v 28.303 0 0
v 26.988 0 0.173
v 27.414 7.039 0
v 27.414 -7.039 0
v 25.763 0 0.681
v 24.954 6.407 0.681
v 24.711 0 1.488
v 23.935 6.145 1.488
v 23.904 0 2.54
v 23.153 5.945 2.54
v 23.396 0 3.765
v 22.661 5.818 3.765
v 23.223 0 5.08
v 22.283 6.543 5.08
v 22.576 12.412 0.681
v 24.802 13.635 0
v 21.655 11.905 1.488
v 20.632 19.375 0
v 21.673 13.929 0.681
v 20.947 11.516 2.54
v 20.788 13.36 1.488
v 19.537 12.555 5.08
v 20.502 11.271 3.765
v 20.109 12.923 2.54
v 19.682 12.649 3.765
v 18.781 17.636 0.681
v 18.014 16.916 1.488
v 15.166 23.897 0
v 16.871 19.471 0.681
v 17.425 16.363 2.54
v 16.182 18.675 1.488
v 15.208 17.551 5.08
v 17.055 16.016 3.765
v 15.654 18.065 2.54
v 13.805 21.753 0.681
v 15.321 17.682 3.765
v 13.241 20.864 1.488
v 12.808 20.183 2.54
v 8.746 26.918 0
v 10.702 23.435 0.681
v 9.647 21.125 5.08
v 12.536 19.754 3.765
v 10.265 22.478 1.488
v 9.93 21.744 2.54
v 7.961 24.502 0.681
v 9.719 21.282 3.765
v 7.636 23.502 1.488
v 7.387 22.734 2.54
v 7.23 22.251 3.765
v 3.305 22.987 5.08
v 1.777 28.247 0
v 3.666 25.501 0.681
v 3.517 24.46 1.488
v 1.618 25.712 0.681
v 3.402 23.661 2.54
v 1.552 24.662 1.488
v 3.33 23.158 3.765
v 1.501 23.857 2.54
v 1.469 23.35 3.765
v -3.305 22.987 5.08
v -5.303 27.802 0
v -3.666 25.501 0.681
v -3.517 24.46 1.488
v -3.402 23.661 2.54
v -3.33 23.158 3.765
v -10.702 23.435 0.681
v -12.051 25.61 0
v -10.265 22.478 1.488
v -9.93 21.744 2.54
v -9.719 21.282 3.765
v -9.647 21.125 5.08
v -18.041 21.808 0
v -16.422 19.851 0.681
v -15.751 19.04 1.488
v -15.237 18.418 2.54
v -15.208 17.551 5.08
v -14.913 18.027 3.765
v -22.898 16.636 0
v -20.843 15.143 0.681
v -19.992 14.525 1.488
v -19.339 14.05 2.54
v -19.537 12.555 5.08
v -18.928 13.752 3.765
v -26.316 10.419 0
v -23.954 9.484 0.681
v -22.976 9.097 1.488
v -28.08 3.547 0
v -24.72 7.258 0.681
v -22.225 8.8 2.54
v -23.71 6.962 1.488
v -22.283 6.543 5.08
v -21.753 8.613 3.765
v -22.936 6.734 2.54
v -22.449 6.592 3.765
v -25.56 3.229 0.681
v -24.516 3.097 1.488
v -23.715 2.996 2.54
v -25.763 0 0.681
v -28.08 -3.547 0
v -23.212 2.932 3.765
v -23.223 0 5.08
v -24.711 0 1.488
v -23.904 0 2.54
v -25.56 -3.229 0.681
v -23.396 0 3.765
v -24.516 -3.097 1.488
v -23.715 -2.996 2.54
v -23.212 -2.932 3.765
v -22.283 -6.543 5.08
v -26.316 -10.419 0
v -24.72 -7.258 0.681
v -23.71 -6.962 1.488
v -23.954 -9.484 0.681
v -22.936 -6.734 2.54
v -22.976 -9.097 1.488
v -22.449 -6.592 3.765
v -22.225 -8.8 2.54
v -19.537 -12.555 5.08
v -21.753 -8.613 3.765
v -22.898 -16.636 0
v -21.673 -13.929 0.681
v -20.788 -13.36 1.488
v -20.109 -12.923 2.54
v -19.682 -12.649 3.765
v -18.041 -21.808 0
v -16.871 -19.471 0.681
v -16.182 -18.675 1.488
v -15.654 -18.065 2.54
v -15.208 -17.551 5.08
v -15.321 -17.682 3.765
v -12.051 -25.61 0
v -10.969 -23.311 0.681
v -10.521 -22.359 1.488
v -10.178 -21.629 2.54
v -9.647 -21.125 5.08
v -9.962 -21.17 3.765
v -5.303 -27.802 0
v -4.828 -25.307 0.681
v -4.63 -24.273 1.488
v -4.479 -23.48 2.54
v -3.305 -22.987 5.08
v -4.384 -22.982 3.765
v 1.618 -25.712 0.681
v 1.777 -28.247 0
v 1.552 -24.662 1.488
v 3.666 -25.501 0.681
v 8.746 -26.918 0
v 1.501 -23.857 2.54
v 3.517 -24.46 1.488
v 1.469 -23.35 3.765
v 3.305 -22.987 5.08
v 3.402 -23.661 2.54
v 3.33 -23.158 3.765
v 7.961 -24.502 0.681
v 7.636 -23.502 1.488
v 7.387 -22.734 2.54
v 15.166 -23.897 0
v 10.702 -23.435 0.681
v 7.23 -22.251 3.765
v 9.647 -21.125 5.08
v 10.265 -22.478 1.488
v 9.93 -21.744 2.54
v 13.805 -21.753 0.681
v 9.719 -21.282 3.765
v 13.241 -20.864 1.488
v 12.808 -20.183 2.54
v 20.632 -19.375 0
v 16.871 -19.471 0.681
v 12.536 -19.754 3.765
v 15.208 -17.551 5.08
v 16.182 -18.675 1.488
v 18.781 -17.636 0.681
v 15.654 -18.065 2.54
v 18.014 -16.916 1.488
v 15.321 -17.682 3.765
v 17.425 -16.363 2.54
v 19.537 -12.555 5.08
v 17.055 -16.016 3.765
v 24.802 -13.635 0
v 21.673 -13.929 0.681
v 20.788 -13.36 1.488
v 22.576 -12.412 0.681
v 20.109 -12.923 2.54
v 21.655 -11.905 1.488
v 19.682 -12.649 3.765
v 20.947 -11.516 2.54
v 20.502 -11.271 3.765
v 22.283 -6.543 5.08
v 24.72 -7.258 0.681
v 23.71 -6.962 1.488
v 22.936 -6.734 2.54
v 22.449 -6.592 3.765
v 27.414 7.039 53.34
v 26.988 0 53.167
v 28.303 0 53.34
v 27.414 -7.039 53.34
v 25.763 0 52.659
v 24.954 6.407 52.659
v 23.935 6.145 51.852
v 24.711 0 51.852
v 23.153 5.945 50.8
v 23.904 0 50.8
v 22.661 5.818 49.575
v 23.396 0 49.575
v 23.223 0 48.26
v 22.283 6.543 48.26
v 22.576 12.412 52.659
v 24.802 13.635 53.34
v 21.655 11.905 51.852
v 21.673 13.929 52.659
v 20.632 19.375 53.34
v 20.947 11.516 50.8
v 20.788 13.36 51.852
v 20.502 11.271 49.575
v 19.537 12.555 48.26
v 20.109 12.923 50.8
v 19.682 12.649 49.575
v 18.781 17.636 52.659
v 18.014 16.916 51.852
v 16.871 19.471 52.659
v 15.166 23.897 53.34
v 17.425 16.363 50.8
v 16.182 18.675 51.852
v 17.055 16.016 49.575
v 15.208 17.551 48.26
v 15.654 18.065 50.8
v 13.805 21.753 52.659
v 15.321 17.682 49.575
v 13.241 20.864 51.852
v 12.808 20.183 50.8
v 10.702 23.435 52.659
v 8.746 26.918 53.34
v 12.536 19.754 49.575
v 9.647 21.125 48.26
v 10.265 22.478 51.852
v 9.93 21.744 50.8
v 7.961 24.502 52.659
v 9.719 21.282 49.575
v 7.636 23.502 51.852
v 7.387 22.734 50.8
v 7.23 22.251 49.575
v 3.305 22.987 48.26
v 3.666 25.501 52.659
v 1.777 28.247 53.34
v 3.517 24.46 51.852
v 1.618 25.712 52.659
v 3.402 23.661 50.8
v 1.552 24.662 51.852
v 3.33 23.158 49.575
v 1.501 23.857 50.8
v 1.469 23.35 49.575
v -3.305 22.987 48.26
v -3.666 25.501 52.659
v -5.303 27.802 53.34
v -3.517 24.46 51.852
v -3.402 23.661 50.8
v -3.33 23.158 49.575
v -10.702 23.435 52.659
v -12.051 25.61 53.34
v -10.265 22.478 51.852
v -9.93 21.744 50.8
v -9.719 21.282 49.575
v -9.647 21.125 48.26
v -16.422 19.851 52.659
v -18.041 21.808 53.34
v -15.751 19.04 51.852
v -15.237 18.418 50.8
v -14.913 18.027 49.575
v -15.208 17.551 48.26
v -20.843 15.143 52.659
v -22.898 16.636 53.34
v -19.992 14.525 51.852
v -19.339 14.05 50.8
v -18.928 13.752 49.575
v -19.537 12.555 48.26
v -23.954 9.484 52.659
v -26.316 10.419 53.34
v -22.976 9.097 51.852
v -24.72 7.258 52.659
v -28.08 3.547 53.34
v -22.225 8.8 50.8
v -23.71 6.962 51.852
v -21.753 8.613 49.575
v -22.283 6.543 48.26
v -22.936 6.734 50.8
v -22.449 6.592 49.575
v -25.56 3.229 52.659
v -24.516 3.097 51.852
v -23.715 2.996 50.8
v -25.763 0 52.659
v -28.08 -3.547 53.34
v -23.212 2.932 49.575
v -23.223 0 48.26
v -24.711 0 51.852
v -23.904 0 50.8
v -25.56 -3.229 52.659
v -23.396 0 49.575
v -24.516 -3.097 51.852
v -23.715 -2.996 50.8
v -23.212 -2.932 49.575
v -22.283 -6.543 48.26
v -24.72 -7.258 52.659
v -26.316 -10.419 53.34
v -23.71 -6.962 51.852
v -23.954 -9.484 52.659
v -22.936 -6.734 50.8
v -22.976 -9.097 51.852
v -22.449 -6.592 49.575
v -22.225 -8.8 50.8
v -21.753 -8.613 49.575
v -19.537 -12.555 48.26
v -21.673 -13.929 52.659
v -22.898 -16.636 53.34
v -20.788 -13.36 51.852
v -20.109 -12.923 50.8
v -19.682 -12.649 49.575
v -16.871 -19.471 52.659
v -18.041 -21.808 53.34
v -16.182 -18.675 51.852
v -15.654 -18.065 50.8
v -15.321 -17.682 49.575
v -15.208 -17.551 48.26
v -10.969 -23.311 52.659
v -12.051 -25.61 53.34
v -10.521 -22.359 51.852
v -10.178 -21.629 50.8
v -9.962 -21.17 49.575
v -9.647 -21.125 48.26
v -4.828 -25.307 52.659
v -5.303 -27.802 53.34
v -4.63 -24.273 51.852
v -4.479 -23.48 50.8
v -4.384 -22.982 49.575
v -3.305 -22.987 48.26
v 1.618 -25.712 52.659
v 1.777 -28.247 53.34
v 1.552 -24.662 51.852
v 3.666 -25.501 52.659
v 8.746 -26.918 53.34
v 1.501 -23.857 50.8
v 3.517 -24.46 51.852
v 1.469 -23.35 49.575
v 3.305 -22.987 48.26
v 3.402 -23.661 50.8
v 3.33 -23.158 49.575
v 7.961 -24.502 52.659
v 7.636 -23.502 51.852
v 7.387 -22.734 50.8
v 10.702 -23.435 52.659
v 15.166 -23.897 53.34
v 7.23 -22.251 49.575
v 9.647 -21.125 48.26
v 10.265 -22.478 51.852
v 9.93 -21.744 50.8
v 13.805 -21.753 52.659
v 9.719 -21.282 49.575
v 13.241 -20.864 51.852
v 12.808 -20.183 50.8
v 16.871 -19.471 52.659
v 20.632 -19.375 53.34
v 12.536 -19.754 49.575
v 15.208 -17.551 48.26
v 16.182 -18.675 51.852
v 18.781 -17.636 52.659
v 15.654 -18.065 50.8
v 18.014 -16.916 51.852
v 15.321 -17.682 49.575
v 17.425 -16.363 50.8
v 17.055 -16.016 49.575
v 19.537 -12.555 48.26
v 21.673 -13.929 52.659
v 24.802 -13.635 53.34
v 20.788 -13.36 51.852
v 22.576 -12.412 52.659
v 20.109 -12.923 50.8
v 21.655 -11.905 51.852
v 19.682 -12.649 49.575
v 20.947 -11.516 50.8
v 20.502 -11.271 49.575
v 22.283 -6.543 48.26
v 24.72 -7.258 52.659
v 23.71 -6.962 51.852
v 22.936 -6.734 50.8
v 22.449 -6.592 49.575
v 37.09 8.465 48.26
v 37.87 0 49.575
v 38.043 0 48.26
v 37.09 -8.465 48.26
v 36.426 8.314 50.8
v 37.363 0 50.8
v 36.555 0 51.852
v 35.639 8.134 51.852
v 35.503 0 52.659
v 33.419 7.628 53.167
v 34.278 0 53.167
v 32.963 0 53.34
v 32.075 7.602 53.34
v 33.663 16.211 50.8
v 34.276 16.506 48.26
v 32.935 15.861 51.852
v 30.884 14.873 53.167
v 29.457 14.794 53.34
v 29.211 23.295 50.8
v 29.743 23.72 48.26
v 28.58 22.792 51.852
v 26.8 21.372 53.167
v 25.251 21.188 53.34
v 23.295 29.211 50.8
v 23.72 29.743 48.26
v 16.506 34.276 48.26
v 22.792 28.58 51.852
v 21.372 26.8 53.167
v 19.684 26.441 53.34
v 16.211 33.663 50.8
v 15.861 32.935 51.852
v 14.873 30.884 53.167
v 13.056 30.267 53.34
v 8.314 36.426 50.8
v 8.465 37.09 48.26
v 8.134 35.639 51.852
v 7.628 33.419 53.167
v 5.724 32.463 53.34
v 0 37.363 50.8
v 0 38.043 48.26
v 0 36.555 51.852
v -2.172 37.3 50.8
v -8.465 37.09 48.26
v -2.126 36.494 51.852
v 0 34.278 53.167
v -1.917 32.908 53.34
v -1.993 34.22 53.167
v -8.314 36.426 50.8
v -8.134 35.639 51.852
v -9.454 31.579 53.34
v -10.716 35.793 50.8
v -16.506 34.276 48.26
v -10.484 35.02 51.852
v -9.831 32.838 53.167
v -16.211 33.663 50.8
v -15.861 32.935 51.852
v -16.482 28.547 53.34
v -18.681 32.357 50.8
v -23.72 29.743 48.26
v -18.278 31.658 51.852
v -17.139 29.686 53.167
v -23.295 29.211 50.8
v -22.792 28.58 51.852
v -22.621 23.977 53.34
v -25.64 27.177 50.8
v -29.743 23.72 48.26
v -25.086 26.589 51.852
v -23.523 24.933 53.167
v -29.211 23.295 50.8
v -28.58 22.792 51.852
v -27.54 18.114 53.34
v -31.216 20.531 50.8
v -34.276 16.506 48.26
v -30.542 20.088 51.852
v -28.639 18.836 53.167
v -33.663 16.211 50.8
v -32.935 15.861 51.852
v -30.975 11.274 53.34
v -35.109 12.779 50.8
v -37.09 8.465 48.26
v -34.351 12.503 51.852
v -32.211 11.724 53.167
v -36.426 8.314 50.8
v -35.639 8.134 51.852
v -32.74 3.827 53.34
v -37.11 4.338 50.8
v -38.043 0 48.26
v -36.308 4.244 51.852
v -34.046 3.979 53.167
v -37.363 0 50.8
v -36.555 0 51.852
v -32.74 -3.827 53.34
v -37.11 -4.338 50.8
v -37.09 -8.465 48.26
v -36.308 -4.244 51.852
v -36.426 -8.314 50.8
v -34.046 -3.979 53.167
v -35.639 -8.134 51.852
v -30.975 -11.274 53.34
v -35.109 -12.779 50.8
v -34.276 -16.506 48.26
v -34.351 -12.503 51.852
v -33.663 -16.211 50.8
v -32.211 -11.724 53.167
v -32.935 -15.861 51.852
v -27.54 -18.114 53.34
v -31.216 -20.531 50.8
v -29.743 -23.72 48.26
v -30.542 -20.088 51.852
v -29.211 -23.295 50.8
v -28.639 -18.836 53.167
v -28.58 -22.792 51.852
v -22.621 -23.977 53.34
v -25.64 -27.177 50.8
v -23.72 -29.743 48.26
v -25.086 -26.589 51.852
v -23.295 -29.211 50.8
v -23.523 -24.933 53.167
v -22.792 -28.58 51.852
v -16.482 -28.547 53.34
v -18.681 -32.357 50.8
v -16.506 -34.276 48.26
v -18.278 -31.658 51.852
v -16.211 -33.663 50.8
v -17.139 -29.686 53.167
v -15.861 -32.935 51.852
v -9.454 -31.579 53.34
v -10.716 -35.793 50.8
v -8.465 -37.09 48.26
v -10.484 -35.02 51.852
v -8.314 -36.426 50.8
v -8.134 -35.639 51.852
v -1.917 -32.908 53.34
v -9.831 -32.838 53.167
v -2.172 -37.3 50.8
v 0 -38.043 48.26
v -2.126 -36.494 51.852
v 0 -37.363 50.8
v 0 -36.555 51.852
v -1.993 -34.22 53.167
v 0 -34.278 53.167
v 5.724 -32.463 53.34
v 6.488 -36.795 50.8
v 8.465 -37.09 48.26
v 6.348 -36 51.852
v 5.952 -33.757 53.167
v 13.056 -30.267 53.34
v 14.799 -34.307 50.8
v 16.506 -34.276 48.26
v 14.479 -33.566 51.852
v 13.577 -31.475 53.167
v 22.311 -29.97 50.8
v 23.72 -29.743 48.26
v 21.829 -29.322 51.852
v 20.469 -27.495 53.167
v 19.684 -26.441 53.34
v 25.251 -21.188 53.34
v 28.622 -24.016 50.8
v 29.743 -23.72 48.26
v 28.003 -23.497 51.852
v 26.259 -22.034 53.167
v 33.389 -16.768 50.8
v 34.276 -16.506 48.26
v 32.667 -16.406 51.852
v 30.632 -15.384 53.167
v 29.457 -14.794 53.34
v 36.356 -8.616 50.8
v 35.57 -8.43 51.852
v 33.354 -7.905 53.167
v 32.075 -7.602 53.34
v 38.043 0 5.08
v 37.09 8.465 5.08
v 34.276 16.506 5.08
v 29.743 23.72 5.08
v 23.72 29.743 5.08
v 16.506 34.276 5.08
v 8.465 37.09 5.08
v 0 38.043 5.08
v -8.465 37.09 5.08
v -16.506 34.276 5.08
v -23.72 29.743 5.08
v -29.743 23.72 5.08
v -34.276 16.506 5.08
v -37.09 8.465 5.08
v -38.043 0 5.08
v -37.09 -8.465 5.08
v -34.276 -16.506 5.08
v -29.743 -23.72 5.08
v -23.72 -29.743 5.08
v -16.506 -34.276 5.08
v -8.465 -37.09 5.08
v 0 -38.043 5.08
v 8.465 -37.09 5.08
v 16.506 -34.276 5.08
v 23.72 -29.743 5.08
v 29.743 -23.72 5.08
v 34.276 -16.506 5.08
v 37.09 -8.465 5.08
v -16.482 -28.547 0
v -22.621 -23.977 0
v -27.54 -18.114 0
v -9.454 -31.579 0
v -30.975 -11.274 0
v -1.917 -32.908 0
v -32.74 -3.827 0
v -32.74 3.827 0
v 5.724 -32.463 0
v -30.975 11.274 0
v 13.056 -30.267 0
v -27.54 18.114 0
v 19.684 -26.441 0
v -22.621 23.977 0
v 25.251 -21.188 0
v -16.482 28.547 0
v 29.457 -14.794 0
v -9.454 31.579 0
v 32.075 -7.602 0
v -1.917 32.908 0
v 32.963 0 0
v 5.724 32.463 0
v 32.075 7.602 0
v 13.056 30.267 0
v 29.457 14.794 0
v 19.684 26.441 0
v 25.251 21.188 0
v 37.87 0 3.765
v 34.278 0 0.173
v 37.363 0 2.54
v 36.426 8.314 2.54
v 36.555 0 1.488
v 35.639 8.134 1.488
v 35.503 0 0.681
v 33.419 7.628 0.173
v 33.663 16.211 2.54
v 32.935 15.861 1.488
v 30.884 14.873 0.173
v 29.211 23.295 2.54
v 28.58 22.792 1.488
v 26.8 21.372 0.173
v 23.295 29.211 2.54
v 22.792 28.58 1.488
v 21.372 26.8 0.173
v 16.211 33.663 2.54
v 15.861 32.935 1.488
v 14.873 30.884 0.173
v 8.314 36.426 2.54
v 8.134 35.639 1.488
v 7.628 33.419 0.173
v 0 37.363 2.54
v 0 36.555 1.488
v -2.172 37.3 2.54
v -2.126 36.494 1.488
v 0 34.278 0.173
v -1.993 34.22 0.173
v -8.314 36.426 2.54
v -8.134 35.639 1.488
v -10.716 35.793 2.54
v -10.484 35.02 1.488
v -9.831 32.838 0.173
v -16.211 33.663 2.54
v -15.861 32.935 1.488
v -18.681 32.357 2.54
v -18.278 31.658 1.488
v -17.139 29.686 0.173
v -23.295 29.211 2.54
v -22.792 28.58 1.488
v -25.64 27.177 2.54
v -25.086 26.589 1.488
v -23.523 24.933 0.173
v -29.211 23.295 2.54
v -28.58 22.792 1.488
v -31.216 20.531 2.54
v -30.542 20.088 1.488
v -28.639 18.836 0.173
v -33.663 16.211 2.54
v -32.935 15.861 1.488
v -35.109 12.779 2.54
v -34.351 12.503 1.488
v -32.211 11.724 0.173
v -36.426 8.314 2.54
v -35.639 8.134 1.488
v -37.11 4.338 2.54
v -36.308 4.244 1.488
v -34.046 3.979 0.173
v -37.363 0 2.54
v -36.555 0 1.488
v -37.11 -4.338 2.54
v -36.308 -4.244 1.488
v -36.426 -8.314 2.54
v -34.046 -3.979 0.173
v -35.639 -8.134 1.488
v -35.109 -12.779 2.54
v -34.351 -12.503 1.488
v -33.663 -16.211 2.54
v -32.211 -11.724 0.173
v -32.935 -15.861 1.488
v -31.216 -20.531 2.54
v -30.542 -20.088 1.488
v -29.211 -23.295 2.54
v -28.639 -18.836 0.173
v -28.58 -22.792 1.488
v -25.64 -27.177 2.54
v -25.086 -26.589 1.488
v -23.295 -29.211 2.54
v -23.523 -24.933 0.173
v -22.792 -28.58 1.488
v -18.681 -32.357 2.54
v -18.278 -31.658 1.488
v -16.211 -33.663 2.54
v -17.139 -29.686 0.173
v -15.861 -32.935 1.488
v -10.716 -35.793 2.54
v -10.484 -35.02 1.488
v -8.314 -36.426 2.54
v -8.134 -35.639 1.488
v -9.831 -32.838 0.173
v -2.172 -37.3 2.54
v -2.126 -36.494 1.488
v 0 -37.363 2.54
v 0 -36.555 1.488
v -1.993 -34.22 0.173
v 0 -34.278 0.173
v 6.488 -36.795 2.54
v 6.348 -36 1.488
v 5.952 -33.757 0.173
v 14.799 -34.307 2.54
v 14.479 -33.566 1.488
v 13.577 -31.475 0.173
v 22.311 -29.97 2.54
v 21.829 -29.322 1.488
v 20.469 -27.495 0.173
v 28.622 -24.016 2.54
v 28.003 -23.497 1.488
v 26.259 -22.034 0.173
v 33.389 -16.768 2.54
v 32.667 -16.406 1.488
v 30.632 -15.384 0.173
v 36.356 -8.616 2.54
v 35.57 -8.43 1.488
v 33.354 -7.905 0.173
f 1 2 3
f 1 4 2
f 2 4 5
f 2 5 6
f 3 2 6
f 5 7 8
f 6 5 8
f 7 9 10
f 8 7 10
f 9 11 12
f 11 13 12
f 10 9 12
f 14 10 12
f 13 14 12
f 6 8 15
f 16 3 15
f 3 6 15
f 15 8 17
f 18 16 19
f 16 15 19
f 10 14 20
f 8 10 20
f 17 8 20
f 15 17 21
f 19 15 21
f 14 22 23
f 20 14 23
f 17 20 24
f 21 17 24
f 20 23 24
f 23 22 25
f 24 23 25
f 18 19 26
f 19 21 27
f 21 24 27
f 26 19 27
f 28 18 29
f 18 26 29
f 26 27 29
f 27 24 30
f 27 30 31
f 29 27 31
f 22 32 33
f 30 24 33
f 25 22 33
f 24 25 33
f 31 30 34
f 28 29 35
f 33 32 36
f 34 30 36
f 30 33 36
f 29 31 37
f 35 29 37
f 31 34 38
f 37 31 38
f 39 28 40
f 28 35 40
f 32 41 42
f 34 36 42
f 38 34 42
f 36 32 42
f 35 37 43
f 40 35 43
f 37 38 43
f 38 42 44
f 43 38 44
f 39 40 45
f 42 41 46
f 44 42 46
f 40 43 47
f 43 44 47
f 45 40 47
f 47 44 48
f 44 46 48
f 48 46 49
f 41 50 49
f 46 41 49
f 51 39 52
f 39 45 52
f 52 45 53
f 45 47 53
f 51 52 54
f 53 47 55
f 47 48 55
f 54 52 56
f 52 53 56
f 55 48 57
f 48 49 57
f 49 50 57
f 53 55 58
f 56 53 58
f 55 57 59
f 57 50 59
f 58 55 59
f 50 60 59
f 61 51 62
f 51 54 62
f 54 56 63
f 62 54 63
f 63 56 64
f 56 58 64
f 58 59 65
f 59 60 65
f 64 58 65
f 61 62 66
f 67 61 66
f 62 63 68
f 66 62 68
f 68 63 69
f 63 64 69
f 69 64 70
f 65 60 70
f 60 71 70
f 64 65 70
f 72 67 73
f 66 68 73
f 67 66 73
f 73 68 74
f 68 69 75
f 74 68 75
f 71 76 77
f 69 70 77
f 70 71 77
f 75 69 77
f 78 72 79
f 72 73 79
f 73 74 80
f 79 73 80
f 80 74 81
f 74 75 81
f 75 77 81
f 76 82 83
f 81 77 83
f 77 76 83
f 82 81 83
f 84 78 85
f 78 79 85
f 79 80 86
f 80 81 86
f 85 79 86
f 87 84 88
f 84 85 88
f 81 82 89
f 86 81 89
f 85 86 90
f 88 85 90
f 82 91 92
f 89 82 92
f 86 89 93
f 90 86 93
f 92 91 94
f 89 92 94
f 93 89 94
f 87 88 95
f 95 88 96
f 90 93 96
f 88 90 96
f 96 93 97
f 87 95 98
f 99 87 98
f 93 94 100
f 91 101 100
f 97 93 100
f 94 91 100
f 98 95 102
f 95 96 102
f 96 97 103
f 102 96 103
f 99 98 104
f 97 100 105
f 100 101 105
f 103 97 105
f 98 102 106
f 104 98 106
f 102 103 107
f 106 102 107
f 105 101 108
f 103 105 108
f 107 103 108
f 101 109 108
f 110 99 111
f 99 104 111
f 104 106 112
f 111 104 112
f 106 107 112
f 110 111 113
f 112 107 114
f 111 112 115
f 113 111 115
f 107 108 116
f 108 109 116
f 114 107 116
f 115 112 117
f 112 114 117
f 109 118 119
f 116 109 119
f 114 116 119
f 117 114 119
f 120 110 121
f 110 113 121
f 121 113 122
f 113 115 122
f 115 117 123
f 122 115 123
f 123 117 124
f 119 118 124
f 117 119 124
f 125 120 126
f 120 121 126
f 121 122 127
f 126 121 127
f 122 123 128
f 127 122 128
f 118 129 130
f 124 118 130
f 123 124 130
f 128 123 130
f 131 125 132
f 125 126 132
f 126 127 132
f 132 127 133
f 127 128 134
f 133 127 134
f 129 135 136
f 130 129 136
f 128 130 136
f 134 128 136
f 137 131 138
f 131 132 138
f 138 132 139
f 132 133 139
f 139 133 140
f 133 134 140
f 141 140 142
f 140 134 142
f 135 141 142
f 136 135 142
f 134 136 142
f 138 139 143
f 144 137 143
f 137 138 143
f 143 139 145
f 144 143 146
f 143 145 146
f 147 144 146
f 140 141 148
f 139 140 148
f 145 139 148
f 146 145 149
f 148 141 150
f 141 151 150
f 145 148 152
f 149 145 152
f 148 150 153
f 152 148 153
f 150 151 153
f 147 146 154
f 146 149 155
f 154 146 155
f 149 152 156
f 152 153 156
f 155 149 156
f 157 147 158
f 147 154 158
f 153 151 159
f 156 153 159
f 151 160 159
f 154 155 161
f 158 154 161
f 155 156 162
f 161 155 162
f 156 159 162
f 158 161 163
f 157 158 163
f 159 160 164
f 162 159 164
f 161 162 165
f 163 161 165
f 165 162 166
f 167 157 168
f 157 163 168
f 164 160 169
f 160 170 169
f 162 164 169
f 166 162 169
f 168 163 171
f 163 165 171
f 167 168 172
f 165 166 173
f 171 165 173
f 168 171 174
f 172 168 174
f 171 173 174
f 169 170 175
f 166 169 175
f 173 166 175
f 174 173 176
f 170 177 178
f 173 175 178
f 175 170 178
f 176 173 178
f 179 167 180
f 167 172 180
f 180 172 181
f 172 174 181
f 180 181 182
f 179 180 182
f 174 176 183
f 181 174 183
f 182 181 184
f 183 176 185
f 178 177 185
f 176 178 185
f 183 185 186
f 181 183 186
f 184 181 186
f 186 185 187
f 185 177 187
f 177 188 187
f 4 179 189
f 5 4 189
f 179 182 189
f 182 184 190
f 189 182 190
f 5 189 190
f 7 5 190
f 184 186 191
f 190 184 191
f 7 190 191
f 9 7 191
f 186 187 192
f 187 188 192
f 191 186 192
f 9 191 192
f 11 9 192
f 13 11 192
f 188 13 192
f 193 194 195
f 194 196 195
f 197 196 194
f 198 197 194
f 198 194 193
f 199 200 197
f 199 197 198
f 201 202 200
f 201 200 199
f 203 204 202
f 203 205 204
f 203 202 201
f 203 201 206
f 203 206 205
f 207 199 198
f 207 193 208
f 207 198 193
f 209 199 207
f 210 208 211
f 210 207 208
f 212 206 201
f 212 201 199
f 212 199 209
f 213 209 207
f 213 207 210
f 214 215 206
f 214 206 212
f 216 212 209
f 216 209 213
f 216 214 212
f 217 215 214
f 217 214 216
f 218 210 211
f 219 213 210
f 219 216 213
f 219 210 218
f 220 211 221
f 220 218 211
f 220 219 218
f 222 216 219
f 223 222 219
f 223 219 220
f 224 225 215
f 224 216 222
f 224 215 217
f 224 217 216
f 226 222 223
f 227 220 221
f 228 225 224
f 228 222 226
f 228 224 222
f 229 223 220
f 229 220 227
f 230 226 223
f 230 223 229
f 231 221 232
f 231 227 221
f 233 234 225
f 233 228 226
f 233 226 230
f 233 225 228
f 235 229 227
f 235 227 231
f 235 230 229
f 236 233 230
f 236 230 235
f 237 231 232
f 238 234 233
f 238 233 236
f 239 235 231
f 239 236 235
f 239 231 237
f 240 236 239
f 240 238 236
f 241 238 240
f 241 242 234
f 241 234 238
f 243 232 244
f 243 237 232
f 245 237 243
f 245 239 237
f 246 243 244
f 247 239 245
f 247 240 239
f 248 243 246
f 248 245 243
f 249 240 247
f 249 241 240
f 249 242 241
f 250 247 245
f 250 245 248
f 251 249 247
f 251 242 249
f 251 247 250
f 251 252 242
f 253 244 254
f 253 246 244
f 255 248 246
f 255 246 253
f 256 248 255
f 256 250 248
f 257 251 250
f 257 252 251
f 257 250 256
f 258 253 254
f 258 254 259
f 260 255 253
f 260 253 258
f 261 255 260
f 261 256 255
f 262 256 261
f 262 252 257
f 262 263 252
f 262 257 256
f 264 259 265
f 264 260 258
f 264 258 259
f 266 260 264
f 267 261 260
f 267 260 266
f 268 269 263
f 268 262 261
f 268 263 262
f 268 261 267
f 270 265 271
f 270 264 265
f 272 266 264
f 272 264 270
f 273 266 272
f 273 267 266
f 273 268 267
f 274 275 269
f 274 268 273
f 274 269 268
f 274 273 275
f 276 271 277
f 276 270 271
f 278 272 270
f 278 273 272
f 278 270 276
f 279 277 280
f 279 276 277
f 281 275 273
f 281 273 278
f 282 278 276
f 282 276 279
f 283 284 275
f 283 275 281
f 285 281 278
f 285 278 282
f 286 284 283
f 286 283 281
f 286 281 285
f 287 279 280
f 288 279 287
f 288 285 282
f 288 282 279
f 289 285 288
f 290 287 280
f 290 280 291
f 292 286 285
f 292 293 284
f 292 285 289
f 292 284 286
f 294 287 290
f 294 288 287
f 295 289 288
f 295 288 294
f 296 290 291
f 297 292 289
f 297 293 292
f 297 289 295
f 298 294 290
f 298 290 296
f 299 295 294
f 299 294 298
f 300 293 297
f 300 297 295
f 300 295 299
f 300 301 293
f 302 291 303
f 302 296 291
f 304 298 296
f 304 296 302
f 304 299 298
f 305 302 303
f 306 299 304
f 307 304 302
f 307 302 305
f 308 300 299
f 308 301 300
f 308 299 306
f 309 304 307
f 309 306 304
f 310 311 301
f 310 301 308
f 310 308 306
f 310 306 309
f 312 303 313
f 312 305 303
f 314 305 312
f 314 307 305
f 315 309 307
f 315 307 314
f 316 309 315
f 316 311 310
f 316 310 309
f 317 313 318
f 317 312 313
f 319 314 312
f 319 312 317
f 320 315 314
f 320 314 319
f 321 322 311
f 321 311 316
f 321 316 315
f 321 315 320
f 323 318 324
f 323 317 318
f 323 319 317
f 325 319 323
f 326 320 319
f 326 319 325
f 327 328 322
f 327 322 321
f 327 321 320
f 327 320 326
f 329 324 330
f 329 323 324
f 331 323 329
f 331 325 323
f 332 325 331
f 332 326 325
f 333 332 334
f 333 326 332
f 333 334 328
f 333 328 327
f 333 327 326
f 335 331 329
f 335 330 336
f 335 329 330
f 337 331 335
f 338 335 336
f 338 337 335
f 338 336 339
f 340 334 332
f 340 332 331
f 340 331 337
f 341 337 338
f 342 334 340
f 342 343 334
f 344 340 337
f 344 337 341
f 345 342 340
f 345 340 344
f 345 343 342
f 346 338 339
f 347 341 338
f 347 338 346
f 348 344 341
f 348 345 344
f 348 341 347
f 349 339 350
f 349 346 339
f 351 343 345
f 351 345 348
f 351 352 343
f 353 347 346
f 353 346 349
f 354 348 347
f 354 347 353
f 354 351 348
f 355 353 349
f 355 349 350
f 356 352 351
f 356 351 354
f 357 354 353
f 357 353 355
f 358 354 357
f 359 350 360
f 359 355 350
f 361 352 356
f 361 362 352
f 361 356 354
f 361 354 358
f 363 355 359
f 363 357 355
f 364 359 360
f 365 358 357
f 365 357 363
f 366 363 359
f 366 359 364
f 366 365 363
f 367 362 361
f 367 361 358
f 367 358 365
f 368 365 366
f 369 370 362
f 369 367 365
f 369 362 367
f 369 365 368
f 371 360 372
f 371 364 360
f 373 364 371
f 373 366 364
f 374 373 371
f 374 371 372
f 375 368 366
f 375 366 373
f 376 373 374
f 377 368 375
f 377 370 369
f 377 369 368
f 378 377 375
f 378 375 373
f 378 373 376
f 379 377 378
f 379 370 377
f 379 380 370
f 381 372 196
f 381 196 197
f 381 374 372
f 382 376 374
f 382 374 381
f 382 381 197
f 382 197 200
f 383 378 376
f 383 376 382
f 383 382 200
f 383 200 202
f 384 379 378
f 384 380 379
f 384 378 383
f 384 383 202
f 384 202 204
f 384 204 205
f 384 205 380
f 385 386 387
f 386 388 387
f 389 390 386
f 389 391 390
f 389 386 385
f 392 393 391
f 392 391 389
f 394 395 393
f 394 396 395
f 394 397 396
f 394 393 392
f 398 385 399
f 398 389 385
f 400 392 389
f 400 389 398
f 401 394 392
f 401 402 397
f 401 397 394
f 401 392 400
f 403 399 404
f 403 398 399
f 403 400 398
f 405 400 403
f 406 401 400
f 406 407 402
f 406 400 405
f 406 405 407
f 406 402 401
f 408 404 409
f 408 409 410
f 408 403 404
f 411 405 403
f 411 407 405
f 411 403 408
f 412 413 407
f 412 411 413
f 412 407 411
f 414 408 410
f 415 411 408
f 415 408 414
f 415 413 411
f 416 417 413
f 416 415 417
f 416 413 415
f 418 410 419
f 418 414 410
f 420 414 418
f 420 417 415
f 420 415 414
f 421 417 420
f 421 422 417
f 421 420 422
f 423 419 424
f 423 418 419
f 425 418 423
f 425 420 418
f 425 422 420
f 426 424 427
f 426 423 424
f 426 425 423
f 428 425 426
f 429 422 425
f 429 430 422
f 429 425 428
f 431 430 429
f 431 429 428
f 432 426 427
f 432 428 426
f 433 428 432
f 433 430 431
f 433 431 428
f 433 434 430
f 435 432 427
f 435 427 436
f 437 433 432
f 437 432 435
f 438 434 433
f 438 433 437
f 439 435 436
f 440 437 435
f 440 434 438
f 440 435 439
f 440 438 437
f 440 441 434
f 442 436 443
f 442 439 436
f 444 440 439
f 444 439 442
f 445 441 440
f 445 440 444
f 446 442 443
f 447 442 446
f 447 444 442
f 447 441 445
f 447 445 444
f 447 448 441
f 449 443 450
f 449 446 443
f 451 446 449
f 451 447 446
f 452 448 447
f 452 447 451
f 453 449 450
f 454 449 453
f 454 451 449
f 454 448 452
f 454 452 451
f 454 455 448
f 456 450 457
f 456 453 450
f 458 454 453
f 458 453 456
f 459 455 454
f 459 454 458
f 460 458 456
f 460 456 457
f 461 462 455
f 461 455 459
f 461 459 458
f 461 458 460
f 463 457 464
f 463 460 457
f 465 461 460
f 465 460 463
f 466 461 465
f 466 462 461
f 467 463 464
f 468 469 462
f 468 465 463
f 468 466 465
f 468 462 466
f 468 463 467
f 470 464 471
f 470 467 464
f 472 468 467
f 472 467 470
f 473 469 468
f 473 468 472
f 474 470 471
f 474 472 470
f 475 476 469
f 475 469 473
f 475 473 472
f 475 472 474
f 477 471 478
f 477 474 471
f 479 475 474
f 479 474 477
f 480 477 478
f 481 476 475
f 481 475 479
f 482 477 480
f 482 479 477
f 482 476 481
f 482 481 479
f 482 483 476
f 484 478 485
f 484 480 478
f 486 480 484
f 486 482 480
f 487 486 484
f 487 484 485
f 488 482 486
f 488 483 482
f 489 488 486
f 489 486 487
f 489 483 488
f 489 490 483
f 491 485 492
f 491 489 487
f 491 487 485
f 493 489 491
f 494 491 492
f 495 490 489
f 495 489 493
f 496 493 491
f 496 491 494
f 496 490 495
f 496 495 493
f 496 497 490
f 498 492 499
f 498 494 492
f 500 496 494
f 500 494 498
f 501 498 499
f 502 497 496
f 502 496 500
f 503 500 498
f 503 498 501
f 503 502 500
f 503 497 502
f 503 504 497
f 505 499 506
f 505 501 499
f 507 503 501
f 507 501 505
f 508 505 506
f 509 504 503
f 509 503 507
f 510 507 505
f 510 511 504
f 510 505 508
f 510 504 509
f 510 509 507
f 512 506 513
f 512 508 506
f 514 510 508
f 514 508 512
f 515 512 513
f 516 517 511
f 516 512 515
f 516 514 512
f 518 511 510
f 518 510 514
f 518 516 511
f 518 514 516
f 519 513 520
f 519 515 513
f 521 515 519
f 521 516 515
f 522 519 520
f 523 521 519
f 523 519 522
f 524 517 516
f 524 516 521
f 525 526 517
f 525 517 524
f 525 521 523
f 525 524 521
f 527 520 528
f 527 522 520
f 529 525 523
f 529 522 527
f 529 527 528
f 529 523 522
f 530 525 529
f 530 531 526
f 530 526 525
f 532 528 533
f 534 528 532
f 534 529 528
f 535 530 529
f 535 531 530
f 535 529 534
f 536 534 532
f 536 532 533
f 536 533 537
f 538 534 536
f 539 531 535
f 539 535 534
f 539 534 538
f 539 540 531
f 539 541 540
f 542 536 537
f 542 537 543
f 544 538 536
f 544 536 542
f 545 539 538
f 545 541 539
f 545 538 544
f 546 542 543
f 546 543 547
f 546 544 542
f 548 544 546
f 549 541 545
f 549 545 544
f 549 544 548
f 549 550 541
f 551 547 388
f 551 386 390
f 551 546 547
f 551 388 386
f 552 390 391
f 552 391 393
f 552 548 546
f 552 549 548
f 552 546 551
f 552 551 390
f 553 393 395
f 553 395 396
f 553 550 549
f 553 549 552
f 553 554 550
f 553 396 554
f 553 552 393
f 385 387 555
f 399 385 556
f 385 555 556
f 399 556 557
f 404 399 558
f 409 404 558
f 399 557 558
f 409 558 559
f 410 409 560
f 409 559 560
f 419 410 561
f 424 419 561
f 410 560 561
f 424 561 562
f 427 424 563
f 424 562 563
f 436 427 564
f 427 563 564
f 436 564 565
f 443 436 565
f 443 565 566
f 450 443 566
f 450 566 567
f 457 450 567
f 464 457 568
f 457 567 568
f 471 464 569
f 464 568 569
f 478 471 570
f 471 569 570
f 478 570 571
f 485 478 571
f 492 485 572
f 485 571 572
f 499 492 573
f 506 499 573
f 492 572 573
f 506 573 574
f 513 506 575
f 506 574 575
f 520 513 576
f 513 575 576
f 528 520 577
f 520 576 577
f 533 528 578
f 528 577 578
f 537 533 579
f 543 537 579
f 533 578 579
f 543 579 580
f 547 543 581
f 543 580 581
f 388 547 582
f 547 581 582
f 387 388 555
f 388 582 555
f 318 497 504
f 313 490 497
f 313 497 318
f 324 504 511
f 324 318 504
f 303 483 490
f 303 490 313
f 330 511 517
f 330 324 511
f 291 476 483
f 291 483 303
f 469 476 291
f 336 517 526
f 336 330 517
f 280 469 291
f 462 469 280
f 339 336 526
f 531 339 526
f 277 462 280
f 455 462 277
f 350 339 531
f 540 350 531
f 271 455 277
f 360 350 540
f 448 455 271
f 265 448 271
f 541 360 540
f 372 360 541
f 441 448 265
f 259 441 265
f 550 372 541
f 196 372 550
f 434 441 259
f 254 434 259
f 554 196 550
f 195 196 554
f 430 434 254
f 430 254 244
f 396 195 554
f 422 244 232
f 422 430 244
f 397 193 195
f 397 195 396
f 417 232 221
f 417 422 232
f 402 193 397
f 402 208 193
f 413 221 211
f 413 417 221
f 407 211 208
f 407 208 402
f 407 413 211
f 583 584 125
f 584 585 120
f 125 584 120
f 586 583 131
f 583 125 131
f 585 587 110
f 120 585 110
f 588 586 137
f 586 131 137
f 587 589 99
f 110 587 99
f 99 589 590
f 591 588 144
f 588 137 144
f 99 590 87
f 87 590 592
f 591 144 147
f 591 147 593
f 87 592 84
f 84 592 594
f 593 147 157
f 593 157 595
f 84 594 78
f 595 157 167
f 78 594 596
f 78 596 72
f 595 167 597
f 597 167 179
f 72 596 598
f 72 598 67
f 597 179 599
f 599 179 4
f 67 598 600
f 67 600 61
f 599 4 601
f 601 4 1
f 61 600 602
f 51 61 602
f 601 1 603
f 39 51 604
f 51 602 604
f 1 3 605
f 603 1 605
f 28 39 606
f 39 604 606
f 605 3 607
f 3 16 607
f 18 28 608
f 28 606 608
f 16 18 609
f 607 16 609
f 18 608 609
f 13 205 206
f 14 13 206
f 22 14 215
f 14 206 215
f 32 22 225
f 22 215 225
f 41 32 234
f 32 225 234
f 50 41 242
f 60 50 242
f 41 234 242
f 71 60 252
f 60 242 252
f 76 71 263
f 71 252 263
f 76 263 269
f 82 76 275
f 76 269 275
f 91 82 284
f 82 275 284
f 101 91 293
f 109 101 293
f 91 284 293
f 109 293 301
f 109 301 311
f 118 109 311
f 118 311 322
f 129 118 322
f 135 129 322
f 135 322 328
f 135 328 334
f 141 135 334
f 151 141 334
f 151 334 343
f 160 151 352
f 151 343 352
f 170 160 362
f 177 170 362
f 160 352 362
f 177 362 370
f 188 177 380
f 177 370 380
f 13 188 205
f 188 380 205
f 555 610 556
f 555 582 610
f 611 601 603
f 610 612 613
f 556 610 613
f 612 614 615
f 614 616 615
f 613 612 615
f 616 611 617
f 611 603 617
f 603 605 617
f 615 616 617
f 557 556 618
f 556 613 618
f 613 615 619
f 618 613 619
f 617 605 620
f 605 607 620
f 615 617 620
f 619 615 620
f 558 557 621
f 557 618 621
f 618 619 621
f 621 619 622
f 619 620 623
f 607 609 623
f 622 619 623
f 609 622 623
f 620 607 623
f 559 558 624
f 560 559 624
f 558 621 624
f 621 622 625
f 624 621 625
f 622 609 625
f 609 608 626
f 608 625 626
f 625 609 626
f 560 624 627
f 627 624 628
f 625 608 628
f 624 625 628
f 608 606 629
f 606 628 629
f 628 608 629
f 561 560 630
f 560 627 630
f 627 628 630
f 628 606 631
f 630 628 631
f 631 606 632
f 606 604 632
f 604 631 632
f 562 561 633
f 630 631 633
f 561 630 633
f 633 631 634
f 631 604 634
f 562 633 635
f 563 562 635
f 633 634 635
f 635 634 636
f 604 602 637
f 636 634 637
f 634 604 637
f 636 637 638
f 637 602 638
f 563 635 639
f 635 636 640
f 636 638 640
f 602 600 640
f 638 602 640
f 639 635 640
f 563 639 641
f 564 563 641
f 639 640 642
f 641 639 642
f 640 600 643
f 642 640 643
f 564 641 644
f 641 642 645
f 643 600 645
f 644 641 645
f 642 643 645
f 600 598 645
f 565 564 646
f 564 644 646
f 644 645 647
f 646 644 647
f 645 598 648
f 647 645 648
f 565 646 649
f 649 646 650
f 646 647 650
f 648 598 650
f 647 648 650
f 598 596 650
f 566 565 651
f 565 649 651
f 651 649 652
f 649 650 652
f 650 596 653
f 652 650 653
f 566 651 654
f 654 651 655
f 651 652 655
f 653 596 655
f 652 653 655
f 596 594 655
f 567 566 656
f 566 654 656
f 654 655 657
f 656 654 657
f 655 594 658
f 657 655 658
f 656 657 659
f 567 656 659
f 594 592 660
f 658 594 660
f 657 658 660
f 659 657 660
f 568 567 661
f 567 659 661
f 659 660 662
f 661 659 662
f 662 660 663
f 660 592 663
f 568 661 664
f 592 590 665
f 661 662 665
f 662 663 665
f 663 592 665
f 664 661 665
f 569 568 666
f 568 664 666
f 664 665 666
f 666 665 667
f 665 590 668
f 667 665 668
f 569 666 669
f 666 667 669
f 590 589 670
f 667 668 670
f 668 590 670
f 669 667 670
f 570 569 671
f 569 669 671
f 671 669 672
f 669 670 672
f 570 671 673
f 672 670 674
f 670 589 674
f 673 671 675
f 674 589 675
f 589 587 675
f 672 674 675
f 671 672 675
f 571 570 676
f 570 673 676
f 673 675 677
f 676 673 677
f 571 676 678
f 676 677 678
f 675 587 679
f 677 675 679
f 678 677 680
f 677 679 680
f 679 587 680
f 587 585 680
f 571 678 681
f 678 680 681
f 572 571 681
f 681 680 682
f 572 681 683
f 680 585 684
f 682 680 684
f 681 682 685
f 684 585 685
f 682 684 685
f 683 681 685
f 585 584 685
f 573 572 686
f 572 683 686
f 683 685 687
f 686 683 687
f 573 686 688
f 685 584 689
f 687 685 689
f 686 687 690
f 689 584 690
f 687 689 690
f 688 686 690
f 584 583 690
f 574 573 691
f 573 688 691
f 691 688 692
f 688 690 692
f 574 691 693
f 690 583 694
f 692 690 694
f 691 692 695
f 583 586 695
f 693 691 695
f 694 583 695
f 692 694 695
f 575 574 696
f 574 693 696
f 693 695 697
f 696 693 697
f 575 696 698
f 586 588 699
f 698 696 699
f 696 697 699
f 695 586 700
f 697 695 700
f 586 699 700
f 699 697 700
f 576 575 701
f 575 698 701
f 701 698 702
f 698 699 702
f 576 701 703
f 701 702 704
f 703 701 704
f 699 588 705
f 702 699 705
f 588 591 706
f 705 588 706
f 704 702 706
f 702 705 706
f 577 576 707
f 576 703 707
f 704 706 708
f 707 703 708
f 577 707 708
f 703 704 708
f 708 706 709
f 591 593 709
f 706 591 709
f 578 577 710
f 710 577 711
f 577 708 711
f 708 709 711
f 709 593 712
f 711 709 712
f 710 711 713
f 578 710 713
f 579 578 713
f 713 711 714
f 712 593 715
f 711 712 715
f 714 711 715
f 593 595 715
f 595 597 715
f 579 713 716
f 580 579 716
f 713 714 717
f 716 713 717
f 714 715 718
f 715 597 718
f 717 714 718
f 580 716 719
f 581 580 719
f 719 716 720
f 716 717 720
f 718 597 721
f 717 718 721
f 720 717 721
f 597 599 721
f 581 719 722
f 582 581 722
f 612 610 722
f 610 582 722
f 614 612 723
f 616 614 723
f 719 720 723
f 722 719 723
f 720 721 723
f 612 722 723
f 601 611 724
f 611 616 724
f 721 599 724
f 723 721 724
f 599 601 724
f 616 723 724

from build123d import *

# Parameters (mm, degrees)
F0_R     = 38.043334
F1_DEPTH = 53.34
F2_R     = 23.223229
F3_DEPTH = 53.34
F4_R     = 5.08


with BuildPart() as f1:
    # F0 (on Top) → F1 (new body)
    with BuildSketch(Plane.XY):
        Circle(F0_R)
    extrude(amount=F1_DEPTH)

    # F2 (on face) → F3 (cut, through all)
    with BuildSketch(Plane.XY.offset(53.34)):
        Circle(F2_R)
    extrude(amount=-F3_DEPTH, mode=Mode.SUBTRACT)

    # F4
    f4_edges = [f1.edges().sort_by_distance(p)[0] for p in [
        (-38.043334, 0, 53.34),
        (-23.223229, 0, 53.34),
        (-38.043334, 0, 0),
        (-23.223229, 0, 0),
    ]]
    fillet(f4_edges, radius=F4_R)


solid = f1.part
